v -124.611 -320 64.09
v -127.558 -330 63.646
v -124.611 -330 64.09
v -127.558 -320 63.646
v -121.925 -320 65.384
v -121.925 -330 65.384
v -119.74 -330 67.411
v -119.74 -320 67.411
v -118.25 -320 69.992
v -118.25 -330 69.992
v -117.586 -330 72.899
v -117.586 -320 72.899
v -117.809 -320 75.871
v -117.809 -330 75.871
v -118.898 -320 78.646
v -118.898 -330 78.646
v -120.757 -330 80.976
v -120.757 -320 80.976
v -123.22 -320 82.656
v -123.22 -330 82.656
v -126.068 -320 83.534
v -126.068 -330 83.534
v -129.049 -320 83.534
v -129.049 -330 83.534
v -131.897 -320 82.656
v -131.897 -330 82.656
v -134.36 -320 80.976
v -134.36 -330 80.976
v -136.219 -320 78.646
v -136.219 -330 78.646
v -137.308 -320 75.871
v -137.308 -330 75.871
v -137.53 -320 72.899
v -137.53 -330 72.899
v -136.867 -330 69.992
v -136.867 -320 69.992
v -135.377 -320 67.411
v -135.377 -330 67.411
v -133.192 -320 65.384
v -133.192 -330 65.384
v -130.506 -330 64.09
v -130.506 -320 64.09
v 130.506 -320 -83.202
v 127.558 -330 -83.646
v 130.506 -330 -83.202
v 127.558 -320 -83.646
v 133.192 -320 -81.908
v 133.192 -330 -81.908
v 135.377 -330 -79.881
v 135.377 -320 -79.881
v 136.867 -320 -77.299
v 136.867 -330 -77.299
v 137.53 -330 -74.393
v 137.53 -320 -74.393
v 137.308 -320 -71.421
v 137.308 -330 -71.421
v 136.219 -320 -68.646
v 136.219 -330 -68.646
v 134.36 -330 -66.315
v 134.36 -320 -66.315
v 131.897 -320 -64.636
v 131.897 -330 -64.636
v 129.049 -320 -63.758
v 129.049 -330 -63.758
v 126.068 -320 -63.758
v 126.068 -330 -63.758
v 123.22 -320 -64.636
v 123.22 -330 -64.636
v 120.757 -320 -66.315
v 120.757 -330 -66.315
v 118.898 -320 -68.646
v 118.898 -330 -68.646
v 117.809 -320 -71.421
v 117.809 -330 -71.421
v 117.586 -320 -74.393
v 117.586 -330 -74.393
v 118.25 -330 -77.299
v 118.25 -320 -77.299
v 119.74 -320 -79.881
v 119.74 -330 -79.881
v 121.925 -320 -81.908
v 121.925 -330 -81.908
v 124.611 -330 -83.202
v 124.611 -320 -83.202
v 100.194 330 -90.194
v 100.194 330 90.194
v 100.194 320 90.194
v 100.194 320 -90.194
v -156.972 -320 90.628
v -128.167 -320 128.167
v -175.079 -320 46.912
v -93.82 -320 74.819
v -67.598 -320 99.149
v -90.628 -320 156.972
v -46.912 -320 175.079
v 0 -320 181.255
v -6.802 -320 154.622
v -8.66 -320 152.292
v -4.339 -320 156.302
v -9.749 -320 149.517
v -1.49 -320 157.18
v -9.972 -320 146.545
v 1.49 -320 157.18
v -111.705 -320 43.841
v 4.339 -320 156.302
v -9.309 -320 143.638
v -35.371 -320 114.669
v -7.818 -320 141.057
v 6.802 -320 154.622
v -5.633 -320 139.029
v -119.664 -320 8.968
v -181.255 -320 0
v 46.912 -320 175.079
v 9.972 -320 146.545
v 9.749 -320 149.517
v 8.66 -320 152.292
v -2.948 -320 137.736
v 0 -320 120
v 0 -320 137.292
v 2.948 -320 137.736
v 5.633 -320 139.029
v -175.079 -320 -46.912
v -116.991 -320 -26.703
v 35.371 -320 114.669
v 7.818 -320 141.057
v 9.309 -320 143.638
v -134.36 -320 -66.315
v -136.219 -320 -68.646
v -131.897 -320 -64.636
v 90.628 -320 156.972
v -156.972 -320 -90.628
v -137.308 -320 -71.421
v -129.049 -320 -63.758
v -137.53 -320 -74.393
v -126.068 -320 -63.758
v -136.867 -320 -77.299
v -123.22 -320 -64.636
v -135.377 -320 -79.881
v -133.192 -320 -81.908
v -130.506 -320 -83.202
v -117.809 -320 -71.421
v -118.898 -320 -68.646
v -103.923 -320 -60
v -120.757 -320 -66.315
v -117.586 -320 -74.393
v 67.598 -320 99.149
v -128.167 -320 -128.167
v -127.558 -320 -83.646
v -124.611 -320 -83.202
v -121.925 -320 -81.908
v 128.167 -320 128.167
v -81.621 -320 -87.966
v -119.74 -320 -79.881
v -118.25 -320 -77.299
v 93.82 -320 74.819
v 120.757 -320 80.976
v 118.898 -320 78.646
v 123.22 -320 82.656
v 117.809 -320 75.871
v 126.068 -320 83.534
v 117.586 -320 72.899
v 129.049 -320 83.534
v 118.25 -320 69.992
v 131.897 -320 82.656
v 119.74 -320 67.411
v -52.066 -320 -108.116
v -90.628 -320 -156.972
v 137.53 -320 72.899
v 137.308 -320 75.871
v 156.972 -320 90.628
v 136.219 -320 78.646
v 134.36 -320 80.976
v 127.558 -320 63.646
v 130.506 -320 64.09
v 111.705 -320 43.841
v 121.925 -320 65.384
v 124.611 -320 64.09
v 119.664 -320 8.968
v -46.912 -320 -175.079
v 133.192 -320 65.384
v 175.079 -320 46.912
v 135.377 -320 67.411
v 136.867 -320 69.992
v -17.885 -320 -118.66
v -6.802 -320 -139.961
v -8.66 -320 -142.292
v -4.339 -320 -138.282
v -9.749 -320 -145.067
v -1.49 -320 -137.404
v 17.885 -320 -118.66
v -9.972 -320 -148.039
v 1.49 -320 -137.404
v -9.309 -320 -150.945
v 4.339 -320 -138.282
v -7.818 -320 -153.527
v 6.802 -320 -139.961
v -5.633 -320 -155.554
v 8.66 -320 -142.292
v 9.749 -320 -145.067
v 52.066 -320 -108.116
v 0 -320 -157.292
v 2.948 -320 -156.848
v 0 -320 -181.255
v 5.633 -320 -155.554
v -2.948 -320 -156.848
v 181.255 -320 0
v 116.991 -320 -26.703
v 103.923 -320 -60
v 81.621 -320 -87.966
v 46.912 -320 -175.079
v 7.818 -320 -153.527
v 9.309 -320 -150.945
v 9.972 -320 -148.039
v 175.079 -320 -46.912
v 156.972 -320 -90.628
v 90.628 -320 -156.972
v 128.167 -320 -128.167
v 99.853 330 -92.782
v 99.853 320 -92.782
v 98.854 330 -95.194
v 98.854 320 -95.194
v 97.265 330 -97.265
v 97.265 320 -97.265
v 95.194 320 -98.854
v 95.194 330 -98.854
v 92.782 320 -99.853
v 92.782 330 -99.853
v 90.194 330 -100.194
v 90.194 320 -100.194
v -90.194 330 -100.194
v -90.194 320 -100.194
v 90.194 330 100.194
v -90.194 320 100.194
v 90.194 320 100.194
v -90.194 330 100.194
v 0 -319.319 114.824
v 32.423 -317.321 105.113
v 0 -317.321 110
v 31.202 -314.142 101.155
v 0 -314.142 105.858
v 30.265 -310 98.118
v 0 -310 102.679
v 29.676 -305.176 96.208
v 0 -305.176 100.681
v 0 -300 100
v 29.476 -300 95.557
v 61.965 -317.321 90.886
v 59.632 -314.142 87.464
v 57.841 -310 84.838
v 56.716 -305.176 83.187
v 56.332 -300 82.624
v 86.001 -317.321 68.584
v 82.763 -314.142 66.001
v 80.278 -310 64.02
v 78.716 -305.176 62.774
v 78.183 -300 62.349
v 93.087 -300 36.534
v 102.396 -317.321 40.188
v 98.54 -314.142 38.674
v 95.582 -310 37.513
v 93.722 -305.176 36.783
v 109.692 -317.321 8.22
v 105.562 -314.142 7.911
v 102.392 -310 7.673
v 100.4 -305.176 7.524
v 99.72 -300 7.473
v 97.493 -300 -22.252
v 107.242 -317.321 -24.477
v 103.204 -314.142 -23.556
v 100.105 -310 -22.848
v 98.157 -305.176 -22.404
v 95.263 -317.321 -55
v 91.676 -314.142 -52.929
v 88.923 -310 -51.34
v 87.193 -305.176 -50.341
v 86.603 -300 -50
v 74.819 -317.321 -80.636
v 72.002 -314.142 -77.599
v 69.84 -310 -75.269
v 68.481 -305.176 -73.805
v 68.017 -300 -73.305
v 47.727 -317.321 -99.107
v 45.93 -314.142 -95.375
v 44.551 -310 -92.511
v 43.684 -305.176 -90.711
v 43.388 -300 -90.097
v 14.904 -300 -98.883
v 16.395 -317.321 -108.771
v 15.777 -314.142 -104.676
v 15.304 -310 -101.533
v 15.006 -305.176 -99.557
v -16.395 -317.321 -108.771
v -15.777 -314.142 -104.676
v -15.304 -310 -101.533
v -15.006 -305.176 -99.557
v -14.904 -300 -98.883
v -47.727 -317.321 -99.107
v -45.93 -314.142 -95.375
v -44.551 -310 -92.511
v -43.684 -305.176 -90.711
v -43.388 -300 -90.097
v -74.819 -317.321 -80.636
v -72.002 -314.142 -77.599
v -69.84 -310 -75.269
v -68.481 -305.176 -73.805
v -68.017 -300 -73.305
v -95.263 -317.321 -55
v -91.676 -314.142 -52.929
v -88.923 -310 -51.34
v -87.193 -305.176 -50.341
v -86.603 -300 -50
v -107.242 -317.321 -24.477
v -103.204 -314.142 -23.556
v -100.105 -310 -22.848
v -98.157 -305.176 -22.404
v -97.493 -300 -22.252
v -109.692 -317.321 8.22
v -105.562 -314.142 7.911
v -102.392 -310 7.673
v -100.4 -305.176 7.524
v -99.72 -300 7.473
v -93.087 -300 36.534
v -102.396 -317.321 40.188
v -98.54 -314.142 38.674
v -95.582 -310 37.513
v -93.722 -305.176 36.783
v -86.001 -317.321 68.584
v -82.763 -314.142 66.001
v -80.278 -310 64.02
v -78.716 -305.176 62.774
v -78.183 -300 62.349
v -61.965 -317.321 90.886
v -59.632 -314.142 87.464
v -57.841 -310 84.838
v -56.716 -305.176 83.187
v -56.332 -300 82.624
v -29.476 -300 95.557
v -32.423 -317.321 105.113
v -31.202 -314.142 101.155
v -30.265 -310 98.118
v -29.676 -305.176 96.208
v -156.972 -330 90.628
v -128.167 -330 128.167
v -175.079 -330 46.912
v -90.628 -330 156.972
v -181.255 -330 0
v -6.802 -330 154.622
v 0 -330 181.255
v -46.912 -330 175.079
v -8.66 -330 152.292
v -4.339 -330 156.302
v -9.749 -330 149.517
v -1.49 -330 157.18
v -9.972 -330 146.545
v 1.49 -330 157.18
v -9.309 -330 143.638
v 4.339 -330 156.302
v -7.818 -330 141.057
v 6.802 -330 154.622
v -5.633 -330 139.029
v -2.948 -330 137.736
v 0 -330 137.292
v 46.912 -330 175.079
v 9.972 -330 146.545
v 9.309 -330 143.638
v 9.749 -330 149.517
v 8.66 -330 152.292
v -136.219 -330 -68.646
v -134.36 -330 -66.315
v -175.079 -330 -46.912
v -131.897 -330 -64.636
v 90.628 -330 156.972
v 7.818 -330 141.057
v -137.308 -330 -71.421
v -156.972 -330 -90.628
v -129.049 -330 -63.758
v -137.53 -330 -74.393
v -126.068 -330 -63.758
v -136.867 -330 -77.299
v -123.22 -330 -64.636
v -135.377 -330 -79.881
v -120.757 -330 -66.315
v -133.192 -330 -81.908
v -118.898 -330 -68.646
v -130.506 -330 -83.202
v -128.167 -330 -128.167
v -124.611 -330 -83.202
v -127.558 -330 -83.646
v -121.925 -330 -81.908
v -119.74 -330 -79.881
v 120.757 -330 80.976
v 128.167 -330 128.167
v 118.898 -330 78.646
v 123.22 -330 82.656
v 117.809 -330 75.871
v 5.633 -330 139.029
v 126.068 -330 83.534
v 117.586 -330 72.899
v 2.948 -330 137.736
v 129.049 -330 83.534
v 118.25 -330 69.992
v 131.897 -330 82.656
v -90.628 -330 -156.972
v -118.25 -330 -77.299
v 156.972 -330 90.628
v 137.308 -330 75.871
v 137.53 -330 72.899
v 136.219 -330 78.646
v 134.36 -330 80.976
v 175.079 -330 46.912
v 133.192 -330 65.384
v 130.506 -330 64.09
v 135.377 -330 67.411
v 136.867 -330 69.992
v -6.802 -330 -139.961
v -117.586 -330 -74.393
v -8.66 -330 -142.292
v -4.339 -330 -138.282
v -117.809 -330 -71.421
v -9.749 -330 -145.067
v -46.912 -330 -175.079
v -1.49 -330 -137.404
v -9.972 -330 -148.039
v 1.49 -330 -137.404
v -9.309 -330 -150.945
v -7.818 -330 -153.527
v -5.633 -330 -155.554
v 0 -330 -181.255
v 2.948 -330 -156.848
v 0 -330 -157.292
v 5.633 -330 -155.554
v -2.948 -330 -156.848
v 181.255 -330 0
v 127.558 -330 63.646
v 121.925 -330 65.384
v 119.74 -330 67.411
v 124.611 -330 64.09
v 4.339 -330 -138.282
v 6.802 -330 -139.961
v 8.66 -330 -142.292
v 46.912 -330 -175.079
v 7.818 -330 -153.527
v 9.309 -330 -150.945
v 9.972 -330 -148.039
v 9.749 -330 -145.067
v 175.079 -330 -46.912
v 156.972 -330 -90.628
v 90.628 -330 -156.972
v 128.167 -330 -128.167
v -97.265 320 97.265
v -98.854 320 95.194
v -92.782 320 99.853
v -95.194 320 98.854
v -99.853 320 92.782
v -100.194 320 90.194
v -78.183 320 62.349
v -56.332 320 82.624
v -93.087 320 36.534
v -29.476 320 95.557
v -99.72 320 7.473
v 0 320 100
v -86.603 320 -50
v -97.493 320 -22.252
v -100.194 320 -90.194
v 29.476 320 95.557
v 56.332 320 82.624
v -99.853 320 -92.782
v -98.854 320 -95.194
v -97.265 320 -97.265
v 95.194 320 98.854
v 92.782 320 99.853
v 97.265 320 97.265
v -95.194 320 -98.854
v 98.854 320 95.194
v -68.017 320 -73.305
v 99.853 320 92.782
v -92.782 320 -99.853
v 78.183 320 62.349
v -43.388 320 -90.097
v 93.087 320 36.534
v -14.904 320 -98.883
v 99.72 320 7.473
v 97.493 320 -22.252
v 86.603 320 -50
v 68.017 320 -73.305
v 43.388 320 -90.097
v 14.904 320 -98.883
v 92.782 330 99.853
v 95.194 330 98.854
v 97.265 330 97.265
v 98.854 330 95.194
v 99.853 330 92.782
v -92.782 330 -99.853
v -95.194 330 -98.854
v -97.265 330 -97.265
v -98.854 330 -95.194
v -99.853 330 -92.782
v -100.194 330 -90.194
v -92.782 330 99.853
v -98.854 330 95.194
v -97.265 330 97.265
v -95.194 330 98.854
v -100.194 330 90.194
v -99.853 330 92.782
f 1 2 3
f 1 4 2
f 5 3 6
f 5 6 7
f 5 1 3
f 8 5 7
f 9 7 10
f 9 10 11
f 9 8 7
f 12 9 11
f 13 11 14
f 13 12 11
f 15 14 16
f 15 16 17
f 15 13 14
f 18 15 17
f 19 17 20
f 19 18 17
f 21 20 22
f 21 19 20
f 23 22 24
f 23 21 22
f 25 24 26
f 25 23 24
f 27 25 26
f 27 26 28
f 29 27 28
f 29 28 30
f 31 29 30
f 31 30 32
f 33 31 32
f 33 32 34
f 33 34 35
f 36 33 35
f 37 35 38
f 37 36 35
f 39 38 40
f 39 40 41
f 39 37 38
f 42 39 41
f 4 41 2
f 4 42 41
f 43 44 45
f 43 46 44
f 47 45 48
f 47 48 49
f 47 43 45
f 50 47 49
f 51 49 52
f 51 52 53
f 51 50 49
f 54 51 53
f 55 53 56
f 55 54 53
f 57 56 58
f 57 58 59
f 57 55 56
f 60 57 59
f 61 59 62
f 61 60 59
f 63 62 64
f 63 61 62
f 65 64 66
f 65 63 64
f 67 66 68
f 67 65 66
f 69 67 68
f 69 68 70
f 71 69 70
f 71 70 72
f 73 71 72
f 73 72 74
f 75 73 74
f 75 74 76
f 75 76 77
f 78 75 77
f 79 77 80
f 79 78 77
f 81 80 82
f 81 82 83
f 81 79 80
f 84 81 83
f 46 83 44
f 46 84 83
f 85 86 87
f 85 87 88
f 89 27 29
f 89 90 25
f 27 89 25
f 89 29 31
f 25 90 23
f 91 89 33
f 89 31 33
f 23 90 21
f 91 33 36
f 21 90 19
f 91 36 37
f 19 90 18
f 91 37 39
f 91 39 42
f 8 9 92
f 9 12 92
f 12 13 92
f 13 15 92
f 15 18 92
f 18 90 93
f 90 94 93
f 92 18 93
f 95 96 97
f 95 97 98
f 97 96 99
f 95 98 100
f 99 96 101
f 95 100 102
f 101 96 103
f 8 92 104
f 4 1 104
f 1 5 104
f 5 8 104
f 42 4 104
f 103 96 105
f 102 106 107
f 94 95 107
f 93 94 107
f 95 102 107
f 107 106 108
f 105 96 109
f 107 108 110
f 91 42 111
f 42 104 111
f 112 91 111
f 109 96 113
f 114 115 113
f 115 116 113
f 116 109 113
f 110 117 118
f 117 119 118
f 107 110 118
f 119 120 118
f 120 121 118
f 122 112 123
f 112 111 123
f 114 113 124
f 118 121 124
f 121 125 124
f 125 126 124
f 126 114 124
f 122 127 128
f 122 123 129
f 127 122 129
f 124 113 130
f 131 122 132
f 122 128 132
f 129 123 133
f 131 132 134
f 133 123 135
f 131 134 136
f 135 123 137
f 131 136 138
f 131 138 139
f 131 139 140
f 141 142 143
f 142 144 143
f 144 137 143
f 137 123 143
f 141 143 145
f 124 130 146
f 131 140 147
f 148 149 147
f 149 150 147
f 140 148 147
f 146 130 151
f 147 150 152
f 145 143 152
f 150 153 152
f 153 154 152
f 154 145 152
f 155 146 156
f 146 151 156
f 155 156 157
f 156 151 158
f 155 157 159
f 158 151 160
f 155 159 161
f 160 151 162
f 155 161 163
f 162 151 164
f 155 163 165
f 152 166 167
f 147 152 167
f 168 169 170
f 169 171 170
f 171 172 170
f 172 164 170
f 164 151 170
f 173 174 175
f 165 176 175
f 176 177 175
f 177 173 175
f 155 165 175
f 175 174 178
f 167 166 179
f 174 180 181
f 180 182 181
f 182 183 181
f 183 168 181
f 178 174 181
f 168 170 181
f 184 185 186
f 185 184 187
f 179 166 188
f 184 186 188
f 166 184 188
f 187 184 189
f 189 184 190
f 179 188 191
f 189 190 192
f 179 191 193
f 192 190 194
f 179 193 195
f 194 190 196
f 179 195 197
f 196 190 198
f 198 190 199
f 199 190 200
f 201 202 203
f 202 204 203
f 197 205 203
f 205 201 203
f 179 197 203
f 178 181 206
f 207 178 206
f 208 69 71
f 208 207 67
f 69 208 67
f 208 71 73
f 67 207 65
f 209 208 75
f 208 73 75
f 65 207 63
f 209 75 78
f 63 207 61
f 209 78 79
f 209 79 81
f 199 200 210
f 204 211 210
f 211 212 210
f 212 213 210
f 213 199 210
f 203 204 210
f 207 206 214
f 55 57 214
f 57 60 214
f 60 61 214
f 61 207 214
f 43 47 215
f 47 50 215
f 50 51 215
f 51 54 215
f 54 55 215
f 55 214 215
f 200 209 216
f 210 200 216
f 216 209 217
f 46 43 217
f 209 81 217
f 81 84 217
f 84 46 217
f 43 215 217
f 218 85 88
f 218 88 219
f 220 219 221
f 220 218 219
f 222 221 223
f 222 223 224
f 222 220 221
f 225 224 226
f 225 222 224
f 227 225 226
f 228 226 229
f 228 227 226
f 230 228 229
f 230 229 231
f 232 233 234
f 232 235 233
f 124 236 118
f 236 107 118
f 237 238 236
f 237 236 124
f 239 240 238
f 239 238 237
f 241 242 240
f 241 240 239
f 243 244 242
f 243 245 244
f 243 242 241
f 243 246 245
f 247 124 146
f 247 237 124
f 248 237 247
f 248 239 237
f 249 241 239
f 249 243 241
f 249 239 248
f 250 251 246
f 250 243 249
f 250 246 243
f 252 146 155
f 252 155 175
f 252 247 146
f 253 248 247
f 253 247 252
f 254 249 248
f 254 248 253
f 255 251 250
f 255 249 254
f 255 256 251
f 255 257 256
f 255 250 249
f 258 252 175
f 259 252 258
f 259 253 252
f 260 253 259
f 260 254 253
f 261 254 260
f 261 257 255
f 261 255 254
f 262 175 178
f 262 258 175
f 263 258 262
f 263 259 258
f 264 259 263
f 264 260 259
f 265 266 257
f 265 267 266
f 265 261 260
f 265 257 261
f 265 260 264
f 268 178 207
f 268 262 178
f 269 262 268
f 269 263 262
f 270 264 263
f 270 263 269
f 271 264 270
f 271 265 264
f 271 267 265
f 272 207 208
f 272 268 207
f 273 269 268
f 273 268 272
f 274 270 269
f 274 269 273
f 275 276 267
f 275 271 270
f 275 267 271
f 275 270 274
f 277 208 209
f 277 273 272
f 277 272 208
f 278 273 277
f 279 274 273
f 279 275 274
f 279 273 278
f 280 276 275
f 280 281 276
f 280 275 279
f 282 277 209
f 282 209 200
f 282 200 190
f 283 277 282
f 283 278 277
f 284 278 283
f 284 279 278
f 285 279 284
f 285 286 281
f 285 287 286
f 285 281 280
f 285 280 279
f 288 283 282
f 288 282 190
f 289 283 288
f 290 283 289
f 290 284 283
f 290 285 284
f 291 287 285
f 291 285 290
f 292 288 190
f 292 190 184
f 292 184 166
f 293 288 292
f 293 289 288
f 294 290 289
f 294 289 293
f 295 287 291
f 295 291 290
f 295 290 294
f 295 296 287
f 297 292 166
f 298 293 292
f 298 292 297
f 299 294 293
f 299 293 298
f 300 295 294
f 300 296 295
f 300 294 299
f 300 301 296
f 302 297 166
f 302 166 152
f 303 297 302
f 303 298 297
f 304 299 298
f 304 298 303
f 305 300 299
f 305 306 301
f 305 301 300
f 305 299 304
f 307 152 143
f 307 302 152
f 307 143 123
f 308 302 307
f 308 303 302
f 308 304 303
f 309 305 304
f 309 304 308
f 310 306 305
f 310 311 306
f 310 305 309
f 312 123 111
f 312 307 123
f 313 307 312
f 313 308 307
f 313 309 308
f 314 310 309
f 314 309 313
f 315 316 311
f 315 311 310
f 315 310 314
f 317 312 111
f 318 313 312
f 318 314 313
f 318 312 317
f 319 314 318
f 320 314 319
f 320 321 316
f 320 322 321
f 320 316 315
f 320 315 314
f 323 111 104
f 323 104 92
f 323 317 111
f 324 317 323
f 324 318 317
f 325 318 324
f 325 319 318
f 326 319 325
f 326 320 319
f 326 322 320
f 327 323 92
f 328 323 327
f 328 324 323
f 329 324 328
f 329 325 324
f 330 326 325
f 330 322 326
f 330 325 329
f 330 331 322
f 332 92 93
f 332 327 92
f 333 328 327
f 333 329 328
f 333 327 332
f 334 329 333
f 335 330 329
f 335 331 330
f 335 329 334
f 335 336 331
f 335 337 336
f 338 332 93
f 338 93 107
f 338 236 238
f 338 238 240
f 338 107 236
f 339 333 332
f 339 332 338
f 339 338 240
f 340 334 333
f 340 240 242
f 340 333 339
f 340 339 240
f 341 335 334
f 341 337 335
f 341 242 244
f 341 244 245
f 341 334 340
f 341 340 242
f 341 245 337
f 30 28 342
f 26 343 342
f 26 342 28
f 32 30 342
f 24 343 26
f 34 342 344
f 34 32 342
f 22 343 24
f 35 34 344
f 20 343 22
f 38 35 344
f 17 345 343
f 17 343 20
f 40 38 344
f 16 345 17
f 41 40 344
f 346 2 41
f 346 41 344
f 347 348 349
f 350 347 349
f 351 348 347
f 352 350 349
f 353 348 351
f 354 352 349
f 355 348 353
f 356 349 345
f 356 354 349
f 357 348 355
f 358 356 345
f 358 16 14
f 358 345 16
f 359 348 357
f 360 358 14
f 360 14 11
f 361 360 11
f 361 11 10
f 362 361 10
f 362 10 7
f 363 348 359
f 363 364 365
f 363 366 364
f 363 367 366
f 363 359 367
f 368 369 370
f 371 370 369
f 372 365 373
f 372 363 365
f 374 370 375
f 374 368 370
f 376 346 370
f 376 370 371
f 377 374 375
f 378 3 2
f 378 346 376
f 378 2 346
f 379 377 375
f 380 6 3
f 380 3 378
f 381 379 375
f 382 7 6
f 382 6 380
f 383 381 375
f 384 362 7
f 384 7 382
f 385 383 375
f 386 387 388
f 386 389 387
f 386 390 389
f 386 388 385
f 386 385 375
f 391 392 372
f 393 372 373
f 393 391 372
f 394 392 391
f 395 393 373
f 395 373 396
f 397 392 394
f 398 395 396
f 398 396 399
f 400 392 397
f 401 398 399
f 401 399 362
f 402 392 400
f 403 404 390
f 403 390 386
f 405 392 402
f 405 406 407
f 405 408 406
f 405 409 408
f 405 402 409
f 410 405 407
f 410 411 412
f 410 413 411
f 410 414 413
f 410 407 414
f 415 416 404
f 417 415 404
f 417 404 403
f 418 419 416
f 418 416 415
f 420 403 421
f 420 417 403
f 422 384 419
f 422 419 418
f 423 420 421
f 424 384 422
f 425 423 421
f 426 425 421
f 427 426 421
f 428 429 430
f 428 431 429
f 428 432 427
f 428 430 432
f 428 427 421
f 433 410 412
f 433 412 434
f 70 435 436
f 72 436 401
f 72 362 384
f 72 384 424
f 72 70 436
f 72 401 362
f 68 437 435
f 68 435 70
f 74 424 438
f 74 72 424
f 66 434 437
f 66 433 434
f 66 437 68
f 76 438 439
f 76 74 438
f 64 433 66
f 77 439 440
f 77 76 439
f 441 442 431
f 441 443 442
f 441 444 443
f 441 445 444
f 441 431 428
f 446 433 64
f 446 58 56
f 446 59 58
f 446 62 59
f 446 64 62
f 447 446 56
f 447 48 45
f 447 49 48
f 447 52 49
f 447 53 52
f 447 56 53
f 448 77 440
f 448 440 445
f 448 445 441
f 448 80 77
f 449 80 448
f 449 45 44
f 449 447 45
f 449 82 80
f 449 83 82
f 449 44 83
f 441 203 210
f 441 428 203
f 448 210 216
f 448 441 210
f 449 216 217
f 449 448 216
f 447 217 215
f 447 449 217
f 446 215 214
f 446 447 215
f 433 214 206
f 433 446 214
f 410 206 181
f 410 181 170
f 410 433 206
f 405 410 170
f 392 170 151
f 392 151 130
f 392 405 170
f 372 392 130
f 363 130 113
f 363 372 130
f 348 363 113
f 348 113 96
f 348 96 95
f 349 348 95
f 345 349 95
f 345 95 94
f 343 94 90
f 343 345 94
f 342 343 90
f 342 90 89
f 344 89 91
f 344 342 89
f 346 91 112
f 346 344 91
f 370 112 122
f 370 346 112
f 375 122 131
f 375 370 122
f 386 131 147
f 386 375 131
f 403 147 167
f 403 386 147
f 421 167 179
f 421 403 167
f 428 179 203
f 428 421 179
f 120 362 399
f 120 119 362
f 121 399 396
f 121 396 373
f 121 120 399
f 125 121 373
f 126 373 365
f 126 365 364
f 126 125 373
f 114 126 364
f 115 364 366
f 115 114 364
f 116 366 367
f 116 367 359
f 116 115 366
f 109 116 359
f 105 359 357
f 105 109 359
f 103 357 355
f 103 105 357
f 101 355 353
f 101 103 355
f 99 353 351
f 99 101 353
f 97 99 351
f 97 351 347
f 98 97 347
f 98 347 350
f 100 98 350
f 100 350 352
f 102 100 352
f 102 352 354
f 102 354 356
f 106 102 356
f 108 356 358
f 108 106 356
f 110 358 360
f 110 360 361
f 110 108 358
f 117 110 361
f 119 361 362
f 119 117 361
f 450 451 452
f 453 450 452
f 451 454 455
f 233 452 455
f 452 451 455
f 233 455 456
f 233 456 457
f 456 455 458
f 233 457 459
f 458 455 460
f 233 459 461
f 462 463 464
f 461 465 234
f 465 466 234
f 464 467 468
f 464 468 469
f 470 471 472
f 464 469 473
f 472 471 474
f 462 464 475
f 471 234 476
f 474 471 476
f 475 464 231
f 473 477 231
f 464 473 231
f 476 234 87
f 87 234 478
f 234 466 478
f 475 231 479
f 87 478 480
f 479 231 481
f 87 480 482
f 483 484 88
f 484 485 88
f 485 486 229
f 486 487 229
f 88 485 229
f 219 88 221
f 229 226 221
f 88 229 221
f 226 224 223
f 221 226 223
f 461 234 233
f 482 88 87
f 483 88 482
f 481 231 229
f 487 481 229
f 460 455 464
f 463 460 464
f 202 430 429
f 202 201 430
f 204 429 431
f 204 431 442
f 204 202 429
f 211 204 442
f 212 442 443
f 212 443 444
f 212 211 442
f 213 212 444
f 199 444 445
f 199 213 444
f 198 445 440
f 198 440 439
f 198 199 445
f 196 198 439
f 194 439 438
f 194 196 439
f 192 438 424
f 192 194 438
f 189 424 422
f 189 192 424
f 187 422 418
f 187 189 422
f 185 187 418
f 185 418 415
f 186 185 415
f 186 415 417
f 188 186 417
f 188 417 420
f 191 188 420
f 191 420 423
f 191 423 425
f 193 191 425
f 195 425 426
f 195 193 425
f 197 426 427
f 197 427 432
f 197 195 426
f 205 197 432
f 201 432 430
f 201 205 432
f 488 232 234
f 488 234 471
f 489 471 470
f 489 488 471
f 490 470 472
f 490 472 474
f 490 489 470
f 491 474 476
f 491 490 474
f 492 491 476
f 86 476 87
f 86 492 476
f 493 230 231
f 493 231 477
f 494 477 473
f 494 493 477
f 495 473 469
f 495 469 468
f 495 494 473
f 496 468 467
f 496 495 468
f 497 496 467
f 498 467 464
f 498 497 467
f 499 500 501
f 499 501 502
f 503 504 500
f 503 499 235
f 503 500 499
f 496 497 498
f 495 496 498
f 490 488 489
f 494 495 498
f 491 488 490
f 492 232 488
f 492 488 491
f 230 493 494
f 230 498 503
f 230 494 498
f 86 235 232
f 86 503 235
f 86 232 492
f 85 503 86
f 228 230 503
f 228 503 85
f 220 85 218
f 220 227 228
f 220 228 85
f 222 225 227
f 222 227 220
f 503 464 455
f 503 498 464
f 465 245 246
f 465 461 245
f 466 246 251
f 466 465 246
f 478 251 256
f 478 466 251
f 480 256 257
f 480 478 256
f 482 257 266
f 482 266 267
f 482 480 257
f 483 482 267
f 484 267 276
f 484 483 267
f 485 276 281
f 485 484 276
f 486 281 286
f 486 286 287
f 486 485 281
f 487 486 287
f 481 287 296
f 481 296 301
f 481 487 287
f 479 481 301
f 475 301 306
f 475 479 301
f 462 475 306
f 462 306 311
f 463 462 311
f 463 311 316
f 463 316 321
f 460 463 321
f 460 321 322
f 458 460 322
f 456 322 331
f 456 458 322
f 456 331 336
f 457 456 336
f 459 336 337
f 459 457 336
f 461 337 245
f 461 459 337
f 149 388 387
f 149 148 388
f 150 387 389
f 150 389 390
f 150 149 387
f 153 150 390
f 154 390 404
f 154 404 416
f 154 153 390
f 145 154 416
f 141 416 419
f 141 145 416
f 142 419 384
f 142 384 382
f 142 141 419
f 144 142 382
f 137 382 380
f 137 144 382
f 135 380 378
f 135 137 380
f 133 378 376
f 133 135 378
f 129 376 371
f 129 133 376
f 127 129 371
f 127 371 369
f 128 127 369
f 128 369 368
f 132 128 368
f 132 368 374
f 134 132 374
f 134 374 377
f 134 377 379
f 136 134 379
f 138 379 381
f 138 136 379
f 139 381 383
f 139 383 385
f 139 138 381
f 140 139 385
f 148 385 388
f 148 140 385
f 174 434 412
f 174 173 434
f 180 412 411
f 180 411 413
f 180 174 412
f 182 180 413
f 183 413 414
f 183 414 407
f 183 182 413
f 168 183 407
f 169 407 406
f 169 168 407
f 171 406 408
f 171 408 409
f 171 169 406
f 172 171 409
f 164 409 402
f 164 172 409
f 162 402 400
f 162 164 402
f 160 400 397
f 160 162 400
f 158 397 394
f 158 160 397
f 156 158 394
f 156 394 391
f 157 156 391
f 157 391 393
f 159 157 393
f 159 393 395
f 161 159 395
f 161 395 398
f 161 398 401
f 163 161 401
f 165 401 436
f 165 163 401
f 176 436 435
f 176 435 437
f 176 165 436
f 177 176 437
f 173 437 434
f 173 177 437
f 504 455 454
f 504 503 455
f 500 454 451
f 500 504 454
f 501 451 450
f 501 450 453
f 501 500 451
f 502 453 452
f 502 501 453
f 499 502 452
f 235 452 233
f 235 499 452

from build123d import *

# Parameters (mm, degrees)
SKETCH1_R           = 100
BOSS_EXTRUDE1_DEPTH = 325
SKETCH2_R           = 181.25545507
SKETCH2_R_2         = 10
BOSS_EXTRUDE2_DEPTH = 5
FILLET1_R           = 20
BOSS_EXTRUDE3_DEPTH = 5


with BuildPart() as part:
    # Sketch1 → Boss-Extrude1 (new, symmetric)
    with BuildSketch(Plane(origin=(0, 0, 0), x_dir=(1, 0, 0), z_dir=(0, 1, 0))):
        with Locations(Location((0, 0, 0), (0, 0, 270))):
            Circle(SKETCH1_R)
    extrude(amount=BOSS_EXTRUDE1_DEPTH, both=True)

    # Sketch2 → Boss-Extrude2 (add, symmetric)
    with BuildSketch(Plane.XZ.offset(325)):
        with Locations(Location((0, 0, 0), (0, 0, 270))):
            Circle(SKETCH2_R)
        with Locations(Location((0, 147.291814794, 0), (0, 0, 270))):
            Circle(SKETCH2_R_2, mode=Mode.SUBTRACT)
        with Locations(Location((127.558453381, 73.645907397, 0), (0, 0, 270))):
            Circle(SKETCH2_R_2, mode=Mode.SUBTRACT)
        with Locations(Location((127.558453381, -73.645907397, 0), (0, 0, 270))):
            Circle(SKETCH2_R_2, mode=Mode.SUBTRACT)
        with Locations(Location((0, -147.291814794, 0), (0, 0, 270))):
            Circle(SKETCH2_R_2, mode=Mode.SUBTRACT)
        with Locations(Location((-127.558453381, -73.645907397, 0), (0, 0, 270))):
            Circle(SKETCH2_R_2, mode=Mode.SUBTRACT)
        with Locations(Location((-127.558453381, 73.645907397, 0), (0, 0, 270))):
            Circle(SKETCH2_R_2, mode=Mode.SUBTRACT)
    extrude(amount=BOSS_EXTRUDE2_DEPTH, both=True)

    # Fillet1
    fillet1_edges = [part.edges().sort_by_distance(p)[0] for p in [
        (0, -320, -100),
    ]]
    fillet(fillet1_edges, radius=FILLET1_R)

    # Sketch3 → Boss-Extrude3 (add, symmetric)
    with BuildSketch(Plane(origin=(0, 325, 0), x_dir=(1, 0, 0), z_dir=(0, 1, 0))):
        with BuildLine():
            Line((-90.193970518, -100.193970518), (90.193970518, -100.193970518))
            ThreePointArc((90.193970518, -100.193970518), (97.265038329, -97.265038329), (100.193970518, -90.193970518))
            Line((100.193970518, -90.193970518), (100.193970518, 90.193970518))
            ThreePointArc((100.193970518, 90.193970518), (97.265038329, 97.265038329), (90.193970518, 100.193970518))
            Line((90.193970518, 100.193970518), (-90.193970518, 100.193970518))
            ThreePointArc((-90.193970518, 100.193970518), (-97.265038329, 97.265038329), (-100.193970518, 90.193970518))
            Line((-100.193970518, 90.193970518), (-100.193970518, -90.193970518))
            ThreePointArc((-100.193970518, -90.193970518), (-97.265038329, -97.265038329), (-90.193970518, -100.193970518))
        make_face()
    extrude(amount=BOSS_EXTRUDE3_DEPTH, both=True)


solid = part.part
